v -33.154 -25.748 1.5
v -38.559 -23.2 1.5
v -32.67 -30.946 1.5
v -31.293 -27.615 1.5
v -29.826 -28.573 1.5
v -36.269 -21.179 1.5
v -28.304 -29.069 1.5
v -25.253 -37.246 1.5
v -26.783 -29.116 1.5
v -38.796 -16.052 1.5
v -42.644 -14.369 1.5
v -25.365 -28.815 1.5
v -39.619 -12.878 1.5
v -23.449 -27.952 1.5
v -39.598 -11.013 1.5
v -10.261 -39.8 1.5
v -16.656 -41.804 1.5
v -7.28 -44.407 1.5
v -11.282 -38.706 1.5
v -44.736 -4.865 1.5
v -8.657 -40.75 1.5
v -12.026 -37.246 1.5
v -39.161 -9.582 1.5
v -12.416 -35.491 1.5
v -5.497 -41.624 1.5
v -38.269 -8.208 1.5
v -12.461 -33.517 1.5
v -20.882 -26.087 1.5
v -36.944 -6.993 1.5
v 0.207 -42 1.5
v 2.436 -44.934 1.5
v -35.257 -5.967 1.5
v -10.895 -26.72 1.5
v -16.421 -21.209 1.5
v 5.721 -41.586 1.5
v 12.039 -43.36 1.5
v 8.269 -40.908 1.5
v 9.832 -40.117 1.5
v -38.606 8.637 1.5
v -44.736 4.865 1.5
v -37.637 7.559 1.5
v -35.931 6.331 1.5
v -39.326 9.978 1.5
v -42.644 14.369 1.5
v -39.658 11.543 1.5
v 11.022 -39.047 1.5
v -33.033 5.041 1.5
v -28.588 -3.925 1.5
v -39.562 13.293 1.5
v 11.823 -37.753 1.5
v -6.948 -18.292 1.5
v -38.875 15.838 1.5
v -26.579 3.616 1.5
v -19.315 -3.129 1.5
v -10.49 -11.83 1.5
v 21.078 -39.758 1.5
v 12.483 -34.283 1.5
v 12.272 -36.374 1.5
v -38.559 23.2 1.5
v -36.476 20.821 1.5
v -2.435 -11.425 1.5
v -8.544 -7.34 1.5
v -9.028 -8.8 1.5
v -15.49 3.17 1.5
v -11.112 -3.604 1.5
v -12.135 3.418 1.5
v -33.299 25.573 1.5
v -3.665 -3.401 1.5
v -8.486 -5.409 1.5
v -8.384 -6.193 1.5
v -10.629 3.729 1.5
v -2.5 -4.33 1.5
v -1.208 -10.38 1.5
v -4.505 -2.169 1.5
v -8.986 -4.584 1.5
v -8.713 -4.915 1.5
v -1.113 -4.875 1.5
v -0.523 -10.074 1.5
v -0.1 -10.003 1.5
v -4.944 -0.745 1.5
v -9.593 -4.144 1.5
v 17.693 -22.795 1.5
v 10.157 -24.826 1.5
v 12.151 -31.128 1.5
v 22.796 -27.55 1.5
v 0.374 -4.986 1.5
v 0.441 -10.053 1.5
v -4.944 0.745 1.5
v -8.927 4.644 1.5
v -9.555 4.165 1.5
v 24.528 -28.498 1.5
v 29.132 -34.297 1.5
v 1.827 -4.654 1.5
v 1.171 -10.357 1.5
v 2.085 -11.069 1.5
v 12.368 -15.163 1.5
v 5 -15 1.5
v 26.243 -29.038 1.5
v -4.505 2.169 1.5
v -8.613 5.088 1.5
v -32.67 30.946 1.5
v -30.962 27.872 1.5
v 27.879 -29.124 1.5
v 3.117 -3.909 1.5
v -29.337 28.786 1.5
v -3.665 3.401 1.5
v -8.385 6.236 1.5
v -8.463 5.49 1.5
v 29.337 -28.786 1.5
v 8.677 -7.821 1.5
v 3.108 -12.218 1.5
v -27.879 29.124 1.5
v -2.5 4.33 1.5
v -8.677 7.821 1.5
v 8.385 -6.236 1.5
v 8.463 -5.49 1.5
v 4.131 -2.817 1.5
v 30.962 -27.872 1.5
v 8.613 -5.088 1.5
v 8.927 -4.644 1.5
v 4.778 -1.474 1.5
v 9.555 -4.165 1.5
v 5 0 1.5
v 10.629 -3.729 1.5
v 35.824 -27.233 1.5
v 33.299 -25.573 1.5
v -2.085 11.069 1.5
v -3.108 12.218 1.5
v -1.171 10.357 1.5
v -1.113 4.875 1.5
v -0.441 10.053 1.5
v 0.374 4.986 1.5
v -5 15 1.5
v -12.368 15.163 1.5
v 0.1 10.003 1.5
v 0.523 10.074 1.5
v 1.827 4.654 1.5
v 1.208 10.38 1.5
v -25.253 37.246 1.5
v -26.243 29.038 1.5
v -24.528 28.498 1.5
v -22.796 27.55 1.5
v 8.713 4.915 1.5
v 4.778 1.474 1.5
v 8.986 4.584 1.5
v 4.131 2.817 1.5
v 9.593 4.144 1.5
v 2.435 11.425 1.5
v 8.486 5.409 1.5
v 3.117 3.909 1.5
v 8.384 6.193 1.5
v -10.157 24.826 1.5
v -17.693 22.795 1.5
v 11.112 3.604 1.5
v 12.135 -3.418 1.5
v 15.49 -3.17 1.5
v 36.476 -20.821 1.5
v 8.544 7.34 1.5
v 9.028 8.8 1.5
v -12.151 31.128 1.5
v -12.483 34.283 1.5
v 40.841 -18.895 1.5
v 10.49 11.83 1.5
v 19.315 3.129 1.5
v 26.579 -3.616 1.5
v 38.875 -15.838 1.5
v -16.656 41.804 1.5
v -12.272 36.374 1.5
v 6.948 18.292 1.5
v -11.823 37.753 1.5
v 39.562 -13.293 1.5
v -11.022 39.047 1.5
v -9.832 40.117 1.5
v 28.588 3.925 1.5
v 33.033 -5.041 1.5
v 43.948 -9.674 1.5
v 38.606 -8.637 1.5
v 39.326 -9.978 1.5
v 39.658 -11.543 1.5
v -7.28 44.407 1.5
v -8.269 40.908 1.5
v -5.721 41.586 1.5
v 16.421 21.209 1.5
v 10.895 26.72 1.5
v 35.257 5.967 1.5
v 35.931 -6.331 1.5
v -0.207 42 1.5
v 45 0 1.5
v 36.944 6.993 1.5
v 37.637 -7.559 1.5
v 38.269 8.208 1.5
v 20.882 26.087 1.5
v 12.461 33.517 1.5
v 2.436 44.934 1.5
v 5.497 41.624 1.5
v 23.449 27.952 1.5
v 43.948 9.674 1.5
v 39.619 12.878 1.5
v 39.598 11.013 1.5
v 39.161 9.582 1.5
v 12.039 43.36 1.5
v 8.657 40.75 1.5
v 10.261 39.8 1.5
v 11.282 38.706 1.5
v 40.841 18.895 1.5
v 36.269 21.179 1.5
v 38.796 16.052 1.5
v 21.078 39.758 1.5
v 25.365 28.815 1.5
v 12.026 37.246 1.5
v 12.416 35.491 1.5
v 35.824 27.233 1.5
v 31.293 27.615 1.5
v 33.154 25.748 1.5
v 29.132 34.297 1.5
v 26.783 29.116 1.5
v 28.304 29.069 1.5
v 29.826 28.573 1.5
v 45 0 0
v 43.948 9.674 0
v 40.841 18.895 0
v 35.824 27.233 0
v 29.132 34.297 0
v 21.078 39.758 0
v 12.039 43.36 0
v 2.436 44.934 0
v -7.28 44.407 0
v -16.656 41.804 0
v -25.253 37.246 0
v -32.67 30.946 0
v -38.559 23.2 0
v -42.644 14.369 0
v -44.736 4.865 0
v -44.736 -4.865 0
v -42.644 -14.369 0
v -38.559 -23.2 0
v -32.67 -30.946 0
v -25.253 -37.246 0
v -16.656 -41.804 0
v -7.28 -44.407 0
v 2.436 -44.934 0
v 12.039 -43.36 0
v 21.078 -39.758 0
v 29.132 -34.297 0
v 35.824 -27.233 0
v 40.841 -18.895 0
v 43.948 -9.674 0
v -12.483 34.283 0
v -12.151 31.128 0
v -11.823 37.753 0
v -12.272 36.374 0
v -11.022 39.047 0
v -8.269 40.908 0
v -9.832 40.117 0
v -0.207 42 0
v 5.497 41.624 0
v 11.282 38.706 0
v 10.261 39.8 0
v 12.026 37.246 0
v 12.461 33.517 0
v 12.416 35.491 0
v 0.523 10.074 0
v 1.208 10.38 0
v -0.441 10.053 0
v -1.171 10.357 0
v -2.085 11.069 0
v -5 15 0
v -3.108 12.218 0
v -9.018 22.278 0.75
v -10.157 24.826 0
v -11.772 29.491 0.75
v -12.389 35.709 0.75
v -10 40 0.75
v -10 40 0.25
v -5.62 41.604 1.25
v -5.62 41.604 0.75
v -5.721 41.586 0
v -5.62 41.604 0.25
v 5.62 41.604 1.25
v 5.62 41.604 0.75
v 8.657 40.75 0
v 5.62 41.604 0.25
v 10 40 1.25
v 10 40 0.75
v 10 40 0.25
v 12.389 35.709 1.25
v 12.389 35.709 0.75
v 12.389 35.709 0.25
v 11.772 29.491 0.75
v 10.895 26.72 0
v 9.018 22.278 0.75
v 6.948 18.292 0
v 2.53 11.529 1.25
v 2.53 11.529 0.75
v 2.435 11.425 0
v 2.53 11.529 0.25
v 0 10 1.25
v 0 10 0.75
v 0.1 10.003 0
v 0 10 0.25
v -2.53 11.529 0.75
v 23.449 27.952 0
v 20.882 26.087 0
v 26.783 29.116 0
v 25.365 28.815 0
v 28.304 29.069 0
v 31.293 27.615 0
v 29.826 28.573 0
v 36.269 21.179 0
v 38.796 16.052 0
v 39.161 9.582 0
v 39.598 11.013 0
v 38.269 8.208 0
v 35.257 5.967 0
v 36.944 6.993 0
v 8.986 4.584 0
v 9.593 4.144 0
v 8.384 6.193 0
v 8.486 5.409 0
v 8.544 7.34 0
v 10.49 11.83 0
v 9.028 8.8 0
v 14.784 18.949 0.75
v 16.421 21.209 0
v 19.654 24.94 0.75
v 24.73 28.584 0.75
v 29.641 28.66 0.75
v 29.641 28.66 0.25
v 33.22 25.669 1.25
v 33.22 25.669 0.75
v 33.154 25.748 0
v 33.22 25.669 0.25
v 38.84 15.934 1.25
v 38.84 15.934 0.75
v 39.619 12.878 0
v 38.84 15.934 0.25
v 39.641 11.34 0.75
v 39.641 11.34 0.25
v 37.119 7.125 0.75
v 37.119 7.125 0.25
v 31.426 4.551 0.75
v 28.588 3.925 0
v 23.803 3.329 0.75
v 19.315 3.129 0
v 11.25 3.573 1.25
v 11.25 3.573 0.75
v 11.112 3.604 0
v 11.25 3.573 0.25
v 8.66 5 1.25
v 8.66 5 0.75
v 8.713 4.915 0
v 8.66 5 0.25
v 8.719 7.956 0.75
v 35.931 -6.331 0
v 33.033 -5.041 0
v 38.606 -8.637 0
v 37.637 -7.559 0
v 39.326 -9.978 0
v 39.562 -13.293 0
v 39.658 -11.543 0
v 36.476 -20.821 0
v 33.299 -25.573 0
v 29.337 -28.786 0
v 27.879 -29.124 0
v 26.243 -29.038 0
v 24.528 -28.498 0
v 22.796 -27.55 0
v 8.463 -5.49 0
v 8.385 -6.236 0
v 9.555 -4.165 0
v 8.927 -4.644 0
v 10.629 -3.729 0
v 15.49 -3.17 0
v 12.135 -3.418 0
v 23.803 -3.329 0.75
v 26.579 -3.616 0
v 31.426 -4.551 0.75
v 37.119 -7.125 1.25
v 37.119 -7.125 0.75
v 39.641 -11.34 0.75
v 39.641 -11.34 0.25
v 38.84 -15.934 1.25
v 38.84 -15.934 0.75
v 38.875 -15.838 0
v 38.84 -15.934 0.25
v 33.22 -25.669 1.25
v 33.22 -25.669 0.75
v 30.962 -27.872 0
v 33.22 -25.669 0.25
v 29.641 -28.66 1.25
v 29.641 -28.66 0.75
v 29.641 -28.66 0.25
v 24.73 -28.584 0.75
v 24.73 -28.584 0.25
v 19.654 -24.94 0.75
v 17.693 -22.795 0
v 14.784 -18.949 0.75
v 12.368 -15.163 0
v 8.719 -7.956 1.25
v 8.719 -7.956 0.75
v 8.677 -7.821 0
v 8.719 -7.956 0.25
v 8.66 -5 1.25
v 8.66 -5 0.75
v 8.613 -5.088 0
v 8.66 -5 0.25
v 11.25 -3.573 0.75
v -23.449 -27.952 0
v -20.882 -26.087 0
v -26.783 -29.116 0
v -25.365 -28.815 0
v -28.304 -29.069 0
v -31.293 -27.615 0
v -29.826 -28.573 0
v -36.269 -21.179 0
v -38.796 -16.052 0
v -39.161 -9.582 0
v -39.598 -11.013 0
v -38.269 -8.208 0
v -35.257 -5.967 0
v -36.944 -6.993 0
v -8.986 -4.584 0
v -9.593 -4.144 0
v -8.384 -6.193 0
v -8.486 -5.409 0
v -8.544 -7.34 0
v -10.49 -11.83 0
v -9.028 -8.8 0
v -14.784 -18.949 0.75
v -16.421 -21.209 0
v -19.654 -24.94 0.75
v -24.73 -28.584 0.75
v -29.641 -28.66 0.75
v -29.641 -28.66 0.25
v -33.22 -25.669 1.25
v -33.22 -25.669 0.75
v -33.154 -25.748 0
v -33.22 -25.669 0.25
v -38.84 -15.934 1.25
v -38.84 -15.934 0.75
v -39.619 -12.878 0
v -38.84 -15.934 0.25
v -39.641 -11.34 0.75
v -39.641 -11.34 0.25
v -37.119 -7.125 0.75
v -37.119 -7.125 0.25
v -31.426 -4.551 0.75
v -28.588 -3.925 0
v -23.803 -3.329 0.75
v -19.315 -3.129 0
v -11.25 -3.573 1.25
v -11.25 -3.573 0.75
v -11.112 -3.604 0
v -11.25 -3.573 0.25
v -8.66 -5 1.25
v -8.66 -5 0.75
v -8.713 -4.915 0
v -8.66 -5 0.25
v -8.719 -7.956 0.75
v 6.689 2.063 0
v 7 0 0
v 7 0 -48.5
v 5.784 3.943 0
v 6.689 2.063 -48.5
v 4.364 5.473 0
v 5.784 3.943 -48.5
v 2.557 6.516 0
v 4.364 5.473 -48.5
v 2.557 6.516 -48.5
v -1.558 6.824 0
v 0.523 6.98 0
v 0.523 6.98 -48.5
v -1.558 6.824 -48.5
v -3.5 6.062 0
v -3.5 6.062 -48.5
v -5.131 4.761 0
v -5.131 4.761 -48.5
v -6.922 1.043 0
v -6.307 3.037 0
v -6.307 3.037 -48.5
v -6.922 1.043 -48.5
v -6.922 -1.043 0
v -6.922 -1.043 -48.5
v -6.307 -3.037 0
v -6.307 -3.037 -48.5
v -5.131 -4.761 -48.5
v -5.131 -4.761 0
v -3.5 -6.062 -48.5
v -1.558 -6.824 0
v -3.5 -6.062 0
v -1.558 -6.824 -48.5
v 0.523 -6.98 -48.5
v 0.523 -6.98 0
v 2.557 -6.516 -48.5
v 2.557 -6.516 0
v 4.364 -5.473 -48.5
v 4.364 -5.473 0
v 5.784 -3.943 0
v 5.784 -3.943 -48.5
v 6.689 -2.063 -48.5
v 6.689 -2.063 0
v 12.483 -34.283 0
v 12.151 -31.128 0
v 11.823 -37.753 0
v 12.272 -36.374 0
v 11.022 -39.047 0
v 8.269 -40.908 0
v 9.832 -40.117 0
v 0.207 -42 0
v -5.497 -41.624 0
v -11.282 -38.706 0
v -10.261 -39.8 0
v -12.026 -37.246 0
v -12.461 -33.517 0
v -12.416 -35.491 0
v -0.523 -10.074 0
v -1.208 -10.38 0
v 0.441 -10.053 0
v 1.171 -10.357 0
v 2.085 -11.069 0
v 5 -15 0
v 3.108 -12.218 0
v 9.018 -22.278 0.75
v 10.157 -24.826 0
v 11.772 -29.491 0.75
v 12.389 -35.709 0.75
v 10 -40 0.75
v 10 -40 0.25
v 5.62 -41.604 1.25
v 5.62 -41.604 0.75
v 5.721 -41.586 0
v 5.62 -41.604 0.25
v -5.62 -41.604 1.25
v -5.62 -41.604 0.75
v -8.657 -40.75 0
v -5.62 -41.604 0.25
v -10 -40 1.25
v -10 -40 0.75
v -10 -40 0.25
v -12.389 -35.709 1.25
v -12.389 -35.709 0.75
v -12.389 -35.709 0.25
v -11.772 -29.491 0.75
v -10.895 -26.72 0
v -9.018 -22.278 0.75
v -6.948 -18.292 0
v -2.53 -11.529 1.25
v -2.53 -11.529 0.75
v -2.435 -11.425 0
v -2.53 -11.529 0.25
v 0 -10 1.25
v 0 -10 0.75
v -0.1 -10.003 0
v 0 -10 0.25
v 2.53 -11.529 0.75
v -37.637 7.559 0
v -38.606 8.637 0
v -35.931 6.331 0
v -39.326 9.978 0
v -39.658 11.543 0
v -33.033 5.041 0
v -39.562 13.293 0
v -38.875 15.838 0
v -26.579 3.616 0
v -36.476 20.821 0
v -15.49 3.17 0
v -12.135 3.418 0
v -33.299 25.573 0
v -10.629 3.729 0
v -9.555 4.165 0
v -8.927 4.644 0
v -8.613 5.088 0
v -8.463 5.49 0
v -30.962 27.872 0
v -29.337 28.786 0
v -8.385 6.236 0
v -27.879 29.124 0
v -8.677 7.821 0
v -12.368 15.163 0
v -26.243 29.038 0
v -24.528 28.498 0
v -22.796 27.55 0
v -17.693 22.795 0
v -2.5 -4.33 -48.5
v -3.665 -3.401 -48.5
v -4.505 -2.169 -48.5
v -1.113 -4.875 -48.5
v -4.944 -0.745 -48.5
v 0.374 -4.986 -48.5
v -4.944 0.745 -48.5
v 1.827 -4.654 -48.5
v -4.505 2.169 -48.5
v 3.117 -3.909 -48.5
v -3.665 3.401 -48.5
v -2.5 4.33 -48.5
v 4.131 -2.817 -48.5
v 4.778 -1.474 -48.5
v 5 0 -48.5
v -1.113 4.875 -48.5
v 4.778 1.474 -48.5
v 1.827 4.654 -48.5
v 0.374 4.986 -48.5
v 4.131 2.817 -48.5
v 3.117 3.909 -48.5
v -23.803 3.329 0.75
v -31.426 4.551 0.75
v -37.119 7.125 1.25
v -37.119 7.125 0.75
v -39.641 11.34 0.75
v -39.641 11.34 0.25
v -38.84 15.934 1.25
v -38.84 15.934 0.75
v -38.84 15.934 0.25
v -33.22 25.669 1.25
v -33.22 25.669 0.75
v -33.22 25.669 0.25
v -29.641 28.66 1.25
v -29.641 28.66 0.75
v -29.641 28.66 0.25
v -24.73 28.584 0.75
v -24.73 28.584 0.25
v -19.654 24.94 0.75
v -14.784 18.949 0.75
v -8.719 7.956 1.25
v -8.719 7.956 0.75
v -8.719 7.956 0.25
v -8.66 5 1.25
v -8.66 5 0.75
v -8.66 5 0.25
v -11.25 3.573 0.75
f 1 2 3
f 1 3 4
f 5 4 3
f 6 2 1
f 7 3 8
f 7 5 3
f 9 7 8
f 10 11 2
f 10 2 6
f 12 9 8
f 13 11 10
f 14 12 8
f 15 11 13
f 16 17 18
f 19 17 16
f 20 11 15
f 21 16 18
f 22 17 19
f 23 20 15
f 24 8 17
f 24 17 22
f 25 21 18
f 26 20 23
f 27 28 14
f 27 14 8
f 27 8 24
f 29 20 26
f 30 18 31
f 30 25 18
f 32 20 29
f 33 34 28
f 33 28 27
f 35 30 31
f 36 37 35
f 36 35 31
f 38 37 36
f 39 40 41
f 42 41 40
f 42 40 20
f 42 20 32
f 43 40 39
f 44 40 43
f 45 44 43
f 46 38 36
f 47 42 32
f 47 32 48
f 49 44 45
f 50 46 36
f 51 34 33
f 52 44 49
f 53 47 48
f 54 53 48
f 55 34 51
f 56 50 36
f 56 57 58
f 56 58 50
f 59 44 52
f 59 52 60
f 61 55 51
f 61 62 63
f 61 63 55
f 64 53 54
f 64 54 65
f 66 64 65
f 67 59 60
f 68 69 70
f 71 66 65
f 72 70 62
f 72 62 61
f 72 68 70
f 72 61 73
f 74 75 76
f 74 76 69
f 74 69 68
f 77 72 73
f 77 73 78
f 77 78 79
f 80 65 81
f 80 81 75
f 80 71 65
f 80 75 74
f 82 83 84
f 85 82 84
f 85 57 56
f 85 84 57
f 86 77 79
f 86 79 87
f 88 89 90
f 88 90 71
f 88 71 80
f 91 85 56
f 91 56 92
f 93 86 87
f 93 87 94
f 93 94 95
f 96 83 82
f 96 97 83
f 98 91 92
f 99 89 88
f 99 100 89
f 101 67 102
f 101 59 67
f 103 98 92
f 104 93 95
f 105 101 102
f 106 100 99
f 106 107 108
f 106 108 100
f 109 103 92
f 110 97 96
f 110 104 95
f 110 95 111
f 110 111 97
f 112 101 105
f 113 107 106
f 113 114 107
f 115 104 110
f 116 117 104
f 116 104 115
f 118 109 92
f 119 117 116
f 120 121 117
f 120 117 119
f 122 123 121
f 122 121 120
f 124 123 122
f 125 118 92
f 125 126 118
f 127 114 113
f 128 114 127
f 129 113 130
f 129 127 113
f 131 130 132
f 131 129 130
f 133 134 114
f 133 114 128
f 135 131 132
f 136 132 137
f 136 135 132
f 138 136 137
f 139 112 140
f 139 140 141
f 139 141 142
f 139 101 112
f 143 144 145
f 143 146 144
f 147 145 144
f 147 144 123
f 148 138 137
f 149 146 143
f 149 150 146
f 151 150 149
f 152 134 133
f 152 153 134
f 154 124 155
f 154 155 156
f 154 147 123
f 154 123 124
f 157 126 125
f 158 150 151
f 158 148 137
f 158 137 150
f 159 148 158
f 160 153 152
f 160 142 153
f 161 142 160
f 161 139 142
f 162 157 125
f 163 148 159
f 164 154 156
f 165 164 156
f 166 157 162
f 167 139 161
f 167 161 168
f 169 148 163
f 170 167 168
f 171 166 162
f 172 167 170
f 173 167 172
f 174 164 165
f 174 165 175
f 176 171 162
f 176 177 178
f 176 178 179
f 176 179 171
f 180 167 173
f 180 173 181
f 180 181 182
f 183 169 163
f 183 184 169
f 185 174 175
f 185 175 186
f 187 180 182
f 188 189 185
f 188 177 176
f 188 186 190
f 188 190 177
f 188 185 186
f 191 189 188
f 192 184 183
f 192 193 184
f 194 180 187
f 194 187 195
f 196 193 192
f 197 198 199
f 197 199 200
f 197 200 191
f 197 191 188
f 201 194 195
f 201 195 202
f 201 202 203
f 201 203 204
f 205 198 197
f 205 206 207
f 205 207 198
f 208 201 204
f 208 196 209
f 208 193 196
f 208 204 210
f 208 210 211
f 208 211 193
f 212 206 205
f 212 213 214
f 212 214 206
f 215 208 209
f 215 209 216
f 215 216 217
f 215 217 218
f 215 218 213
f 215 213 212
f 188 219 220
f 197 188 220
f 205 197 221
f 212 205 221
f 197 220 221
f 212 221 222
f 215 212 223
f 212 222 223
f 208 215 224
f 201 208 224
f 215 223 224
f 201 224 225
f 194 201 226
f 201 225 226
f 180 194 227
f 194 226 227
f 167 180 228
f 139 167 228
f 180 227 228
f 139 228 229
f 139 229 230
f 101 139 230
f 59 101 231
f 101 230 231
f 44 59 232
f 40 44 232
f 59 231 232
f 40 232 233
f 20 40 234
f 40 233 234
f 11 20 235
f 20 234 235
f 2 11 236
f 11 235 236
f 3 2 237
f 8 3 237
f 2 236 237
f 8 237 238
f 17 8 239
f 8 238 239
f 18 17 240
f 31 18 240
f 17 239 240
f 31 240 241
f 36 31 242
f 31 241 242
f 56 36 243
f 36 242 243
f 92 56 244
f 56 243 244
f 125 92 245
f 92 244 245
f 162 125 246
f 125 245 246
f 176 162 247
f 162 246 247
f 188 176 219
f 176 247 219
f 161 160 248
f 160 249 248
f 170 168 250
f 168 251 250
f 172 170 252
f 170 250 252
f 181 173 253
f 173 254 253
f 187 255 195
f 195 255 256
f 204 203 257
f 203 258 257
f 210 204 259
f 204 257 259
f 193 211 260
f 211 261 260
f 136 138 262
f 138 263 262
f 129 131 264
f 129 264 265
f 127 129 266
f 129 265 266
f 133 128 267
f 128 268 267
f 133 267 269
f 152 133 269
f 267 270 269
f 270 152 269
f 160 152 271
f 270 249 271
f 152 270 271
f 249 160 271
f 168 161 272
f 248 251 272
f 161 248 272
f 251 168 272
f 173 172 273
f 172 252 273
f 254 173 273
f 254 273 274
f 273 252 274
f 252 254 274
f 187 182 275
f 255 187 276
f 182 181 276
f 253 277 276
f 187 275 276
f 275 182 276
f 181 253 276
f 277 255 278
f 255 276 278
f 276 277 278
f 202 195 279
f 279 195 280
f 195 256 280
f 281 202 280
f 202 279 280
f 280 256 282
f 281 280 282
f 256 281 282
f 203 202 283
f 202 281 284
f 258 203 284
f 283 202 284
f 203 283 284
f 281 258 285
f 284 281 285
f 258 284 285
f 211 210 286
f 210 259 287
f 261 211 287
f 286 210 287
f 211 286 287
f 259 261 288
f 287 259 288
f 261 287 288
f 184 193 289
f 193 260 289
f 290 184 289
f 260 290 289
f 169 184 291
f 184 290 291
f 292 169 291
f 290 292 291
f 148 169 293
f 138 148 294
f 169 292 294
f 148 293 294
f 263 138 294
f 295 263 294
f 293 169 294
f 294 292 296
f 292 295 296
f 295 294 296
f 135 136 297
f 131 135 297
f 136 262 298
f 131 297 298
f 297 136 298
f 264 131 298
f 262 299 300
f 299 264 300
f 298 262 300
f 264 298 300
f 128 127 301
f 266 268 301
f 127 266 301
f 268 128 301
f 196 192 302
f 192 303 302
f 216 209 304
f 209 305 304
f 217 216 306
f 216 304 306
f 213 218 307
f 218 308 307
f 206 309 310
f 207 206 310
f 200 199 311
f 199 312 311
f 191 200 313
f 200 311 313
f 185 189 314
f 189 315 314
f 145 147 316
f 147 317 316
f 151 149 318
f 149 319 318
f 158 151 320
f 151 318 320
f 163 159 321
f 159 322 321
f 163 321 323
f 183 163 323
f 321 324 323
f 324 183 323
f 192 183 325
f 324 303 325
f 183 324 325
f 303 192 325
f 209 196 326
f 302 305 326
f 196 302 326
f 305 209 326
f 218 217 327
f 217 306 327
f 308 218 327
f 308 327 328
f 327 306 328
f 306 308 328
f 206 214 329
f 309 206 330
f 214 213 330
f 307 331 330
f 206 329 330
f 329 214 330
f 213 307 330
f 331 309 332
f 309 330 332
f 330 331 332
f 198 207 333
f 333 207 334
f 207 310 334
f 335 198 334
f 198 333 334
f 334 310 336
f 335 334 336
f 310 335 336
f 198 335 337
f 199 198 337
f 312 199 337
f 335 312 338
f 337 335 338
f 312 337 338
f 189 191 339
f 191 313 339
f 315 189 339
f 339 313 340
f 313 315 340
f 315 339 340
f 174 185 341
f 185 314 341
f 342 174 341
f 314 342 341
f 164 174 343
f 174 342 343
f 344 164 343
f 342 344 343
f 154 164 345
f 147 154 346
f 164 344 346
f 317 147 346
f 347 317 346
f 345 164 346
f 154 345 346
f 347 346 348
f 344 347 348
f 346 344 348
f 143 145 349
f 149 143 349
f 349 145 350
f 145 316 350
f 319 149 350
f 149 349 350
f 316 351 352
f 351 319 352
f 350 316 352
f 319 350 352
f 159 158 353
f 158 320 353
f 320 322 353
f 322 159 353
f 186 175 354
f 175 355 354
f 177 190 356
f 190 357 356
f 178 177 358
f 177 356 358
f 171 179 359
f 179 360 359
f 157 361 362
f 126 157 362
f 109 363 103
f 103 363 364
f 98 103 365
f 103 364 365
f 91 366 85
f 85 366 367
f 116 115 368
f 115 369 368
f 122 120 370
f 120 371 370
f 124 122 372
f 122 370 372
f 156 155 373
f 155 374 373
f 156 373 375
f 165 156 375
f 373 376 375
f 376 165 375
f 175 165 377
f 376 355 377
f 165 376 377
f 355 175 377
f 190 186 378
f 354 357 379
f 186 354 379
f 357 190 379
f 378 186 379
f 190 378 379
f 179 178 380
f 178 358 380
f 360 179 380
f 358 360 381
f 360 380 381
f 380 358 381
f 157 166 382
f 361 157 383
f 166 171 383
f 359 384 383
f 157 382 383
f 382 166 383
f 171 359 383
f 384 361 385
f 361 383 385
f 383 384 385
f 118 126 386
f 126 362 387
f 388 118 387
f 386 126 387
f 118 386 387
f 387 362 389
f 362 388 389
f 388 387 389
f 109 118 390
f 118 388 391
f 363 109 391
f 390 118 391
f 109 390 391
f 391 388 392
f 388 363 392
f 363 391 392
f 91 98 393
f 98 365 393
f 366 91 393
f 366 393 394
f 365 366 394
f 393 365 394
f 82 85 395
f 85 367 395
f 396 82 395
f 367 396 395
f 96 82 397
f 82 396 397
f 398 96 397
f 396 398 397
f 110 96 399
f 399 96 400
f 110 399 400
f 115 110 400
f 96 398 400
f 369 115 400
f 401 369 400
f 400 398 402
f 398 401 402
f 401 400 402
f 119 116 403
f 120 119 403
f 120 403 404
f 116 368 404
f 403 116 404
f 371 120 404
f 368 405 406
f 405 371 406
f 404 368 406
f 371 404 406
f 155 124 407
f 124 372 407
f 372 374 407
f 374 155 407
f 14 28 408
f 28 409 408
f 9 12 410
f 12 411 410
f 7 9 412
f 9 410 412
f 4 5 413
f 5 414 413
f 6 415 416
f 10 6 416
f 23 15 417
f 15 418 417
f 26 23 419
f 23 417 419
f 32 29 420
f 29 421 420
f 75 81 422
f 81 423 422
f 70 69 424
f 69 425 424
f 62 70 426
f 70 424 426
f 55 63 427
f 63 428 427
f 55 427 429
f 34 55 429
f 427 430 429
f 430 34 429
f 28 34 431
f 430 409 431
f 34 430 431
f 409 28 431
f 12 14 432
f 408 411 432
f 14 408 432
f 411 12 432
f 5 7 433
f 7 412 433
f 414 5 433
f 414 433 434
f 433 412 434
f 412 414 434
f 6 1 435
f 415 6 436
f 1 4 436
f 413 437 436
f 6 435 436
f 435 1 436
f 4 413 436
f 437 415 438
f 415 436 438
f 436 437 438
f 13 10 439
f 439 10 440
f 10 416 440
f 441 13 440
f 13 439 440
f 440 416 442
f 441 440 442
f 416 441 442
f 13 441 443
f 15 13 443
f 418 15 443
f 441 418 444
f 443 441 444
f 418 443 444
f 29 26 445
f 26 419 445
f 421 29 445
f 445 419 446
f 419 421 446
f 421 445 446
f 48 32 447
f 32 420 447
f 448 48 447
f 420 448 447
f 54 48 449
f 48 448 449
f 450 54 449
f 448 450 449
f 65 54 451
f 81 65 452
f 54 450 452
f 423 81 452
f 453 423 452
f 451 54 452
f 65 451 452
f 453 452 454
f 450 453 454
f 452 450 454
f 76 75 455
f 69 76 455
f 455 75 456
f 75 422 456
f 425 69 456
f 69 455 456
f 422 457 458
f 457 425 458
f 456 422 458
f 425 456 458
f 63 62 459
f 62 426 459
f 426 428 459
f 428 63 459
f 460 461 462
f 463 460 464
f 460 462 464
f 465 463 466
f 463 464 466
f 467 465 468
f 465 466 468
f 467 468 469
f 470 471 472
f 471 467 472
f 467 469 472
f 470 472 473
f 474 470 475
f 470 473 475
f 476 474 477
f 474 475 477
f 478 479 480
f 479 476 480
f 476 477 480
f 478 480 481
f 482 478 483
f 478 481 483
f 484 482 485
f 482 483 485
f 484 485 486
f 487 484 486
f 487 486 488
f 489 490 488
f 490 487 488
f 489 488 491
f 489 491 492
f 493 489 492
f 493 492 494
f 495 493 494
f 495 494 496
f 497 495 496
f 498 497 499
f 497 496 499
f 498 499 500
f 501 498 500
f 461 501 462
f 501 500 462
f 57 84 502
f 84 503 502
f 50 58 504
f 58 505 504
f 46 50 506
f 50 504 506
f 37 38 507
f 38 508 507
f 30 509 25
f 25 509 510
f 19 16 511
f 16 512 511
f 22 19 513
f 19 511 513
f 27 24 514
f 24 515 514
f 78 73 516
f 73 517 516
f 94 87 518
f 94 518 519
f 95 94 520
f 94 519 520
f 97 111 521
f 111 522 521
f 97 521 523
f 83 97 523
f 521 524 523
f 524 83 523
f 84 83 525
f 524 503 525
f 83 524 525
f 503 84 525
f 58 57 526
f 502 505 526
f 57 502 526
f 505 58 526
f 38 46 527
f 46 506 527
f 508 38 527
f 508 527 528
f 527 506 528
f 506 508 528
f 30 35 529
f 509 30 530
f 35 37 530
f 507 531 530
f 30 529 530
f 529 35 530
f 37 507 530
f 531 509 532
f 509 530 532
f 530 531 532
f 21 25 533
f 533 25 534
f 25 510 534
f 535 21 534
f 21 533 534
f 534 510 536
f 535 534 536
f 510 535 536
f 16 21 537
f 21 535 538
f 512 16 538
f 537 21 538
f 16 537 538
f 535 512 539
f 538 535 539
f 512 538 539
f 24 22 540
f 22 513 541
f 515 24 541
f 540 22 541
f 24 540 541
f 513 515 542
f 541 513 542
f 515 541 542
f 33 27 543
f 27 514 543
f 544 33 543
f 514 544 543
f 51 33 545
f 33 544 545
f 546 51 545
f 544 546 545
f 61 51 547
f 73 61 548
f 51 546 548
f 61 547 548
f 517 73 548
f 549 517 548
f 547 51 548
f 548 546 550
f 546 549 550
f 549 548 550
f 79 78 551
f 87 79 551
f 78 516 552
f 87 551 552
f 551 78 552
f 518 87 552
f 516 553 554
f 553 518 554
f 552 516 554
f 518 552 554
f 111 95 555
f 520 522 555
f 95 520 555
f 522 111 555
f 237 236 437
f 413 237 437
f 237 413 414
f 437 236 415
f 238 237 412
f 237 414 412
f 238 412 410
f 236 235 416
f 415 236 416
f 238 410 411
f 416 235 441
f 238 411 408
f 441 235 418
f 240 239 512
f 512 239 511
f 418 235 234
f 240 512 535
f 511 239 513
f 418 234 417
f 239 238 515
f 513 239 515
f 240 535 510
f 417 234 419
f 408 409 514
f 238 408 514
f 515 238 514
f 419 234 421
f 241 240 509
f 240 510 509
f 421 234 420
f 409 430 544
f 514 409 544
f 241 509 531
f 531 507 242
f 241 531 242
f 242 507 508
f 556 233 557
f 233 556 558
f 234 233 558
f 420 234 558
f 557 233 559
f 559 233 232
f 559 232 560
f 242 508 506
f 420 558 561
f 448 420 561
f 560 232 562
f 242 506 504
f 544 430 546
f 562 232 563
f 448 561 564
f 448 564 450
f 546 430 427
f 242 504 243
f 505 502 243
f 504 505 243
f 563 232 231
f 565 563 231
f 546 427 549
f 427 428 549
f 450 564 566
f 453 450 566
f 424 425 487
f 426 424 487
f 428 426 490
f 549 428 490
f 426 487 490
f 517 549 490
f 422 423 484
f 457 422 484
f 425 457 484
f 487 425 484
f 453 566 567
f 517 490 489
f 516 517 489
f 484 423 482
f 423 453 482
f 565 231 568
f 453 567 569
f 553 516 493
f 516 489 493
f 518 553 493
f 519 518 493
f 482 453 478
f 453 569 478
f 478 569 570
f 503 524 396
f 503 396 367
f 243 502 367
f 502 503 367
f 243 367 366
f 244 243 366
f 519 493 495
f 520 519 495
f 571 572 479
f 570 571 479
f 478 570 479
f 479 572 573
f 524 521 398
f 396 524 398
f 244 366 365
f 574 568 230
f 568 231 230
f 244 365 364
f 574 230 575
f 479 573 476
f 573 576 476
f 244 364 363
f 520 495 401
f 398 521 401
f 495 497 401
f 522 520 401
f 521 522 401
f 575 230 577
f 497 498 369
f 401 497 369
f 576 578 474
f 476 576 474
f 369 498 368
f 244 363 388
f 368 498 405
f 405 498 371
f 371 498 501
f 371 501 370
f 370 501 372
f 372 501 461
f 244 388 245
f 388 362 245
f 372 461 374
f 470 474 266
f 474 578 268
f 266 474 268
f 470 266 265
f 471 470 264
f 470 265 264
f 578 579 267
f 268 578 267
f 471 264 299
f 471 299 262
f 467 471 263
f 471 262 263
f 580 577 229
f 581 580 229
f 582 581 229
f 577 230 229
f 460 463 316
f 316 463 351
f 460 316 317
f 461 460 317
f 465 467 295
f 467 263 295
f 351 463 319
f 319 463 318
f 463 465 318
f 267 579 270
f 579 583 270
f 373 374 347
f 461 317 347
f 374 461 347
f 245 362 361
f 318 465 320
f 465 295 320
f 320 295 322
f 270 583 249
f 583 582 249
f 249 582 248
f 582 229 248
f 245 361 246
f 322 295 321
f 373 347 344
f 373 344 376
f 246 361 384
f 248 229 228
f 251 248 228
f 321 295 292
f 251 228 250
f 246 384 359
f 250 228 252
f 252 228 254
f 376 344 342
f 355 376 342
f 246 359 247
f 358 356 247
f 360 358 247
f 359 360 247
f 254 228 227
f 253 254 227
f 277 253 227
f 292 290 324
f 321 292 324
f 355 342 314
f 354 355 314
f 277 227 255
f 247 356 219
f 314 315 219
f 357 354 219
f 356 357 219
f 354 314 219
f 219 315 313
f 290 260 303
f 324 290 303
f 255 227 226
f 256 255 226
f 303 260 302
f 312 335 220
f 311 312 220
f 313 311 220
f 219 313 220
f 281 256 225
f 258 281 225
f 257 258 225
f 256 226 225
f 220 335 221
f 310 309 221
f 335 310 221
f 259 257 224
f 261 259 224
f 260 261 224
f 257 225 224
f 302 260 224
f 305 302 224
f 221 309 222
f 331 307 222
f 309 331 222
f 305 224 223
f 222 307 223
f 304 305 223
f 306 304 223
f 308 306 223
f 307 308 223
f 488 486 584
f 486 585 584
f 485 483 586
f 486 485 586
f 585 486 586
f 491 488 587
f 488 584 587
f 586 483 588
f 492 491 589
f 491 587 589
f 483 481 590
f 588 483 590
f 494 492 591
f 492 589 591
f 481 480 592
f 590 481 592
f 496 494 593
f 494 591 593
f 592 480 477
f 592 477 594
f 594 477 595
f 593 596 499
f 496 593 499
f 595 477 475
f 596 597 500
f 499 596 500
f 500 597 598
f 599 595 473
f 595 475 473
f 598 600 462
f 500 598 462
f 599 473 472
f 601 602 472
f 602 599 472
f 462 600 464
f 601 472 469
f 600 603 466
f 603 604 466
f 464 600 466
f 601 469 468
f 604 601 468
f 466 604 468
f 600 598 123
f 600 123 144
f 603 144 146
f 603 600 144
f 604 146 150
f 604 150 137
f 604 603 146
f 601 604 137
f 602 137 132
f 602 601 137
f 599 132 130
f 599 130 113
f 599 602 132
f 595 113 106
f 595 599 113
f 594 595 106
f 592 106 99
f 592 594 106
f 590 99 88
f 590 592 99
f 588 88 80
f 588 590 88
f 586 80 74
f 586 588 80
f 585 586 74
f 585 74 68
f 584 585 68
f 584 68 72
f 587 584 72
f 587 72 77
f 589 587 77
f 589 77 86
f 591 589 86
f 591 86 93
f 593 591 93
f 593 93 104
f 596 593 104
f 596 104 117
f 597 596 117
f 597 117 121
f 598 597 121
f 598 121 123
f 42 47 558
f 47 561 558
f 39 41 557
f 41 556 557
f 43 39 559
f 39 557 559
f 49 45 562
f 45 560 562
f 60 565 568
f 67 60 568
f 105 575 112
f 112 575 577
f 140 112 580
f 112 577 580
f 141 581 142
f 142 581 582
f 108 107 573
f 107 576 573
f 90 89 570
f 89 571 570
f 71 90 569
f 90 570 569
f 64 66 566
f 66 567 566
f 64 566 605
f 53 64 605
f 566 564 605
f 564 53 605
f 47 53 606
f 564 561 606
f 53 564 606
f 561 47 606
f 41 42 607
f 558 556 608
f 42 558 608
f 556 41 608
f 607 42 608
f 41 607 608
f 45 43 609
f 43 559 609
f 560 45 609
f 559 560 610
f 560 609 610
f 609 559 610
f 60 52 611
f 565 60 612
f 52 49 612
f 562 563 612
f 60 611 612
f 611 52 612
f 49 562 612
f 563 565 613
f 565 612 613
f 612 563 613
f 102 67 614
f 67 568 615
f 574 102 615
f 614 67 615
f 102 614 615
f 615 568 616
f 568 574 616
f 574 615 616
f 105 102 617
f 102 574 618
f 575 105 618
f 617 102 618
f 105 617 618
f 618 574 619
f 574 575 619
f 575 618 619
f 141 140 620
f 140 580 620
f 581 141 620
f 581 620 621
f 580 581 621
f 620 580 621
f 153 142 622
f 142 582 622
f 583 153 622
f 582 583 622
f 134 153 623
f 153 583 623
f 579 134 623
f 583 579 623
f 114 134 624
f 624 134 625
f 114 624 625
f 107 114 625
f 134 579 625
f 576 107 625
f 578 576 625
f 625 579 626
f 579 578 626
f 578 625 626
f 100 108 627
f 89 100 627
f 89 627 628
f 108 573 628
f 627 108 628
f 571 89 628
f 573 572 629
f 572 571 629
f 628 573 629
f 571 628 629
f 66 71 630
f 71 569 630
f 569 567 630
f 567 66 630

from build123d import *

# Parameters (mm, degrees)
SKETCH1_R           = 45
SKETCH1_R_2         = 5
BOSS_EXTRUDE1_DEPTH = 1.5
BOSS_EXTRUDE2_START = -50
SKETCH2_R           = 7
SKETCH2_R_2         = 5
BOSS_EXTRUDE2_DEPTH = 50


with BuildPart() as part:
    # Sketch1 → Boss-Extrude1 (new body)
    with BuildSketch(Plane.XY):
        Circle(SKETCH1_R)
        Circle(SKETCH1_R_2, mode=Mode.SUBTRACT)
        with BuildLine():
            add(Edge.make_bspline(
                [(-5, 15), (-10.81459924, 24.333983955), (-17.481193162, 40.633203209), (0, 42.390513369), (17.481193162, 40.633203209), (9.493898899, 21.104991056), (0, 7.588781366), (-3.38732033, 12.411218634), (-5, 15)],
                knots=[0, 0, 0, 0, 0.29808923, 0.417324923, 0.536560615, 0.834649845, 0.917324923, 1, 1, 1, 1], degree=3))
        make_face(mode=Mode.SUBTRACT)
        with BuildLine():
            add(Edge.make_bspline(
                [(10.490381057, 11.830127019), (15.666548661, 21.532709652), (26.448789635, 35.455758972), (36.711261457, 21.195256684), (43.929982797, 5.177444237), (23.024407851, 2.330537901), (6.572077447, 3.794390683), (9.054770464, 9.139114774), (10.490381057, 11.830127019)],
                knots=[0, 0, 0, 0, 0.29808923, 0.417324923, 0.536560615, 0.834649845, 0.917324923, 1, 1, 1, 1], degree=3))
        make_face(mode=Mode.SUBTRACT)
        with BuildLine():
            add(Edge.make_bspline(
                [(15.490381057, -3.169872981), (26.481147901, -2.801274304), (43.929982797, -5.177444237), (36.711261457, -21.195256684), (26.448789635, -35.455758972), (13.530508952, -18.774453155), (6.572077447, -3.794390683), (12.442090794, -3.27210386), (15.490381057, -3.169872981)],
                knots=[0, 0, 0, 0, 0.29808923, 0.417324923, 0.536560615, 0.834649845, 0.917324923, 1, 1, 1, 1], degree=3))
        make_face(mode=Mode.SUBTRACT)
        with BuildLine():
            add(Edge.make_bspline(
                [(5, -15), (10.81459924, -24.333983955), (17.481193162, -40.633203209), (0, -42.390513369), (-17.481193162, -40.633203209), (-9.493898899, -21.104991056), (0, -7.588781366), (3.38732033, -12.411218634), (5, -15)],
                knots=[0, 0, 0, 0, 0.29808923, 0.417324923, 0.536560615, 0.834649845, 0.917324923, 1, 1, 1, 1], degree=3))
        make_face(mode=Mode.SUBTRACT)
        with BuildLine():
            add(Edge.make_bspline(
                [(-10.490381057, -11.830127019), (-15.666548661, -21.532709652), (-26.448789635, -35.455758972), (-36.711261457, -21.195256684), (-43.929982797, -5.177444237), (-23.024407851, -2.330537901), (-6.572077447, -3.794390683), (-9.054770464, -9.139114774), (-10.490381057, -11.830127019)],
                knots=[0, 0, 0, 0, 0.29808923, 0.417324923, 0.536560615, 0.834649845, 0.917324923, 1, 1, 1, 1], degree=3))
        make_face(mode=Mode.SUBTRACT)
        with BuildLine():
            add(Edge.make_bspline(
                [(-15.490381057, 3.169872981), (-26.481147901, 2.801274304), (-43.929982797, 5.177444237), (-36.711261457, 21.195256684), (-26.448789635, 35.455758972), (-13.530508952, 18.774453155), (-6.572077447, 3.794390683), (-12.442090794, 3.27210386), (-15.490381057, 3.169872981)],
                knots=[0, 0, 0, 0, 0.29808923, 0.417324923, 0.536560615, 0.834649845, 0.917324923, 1, 1, 1, 1], degree=3))
        make_face(mode=Mode.SUBTRACT)
    extrude(amount=BOSS_EXTRUDE1_DEPTH)

    # Sketch2 → Boss-Extrude2 (add)
    with BuildSketch(Plane.XY.offset(1.5).offset(BOSS_EXTRUDE2_START)):
        Circle(SKETCH2_R)
        Circle(SKETCH2_R_2, mode=Mode.SUBTRACT)
    extrude(amount=BOSS_EXTRUDE2_DEPTH)


solid = part.part
